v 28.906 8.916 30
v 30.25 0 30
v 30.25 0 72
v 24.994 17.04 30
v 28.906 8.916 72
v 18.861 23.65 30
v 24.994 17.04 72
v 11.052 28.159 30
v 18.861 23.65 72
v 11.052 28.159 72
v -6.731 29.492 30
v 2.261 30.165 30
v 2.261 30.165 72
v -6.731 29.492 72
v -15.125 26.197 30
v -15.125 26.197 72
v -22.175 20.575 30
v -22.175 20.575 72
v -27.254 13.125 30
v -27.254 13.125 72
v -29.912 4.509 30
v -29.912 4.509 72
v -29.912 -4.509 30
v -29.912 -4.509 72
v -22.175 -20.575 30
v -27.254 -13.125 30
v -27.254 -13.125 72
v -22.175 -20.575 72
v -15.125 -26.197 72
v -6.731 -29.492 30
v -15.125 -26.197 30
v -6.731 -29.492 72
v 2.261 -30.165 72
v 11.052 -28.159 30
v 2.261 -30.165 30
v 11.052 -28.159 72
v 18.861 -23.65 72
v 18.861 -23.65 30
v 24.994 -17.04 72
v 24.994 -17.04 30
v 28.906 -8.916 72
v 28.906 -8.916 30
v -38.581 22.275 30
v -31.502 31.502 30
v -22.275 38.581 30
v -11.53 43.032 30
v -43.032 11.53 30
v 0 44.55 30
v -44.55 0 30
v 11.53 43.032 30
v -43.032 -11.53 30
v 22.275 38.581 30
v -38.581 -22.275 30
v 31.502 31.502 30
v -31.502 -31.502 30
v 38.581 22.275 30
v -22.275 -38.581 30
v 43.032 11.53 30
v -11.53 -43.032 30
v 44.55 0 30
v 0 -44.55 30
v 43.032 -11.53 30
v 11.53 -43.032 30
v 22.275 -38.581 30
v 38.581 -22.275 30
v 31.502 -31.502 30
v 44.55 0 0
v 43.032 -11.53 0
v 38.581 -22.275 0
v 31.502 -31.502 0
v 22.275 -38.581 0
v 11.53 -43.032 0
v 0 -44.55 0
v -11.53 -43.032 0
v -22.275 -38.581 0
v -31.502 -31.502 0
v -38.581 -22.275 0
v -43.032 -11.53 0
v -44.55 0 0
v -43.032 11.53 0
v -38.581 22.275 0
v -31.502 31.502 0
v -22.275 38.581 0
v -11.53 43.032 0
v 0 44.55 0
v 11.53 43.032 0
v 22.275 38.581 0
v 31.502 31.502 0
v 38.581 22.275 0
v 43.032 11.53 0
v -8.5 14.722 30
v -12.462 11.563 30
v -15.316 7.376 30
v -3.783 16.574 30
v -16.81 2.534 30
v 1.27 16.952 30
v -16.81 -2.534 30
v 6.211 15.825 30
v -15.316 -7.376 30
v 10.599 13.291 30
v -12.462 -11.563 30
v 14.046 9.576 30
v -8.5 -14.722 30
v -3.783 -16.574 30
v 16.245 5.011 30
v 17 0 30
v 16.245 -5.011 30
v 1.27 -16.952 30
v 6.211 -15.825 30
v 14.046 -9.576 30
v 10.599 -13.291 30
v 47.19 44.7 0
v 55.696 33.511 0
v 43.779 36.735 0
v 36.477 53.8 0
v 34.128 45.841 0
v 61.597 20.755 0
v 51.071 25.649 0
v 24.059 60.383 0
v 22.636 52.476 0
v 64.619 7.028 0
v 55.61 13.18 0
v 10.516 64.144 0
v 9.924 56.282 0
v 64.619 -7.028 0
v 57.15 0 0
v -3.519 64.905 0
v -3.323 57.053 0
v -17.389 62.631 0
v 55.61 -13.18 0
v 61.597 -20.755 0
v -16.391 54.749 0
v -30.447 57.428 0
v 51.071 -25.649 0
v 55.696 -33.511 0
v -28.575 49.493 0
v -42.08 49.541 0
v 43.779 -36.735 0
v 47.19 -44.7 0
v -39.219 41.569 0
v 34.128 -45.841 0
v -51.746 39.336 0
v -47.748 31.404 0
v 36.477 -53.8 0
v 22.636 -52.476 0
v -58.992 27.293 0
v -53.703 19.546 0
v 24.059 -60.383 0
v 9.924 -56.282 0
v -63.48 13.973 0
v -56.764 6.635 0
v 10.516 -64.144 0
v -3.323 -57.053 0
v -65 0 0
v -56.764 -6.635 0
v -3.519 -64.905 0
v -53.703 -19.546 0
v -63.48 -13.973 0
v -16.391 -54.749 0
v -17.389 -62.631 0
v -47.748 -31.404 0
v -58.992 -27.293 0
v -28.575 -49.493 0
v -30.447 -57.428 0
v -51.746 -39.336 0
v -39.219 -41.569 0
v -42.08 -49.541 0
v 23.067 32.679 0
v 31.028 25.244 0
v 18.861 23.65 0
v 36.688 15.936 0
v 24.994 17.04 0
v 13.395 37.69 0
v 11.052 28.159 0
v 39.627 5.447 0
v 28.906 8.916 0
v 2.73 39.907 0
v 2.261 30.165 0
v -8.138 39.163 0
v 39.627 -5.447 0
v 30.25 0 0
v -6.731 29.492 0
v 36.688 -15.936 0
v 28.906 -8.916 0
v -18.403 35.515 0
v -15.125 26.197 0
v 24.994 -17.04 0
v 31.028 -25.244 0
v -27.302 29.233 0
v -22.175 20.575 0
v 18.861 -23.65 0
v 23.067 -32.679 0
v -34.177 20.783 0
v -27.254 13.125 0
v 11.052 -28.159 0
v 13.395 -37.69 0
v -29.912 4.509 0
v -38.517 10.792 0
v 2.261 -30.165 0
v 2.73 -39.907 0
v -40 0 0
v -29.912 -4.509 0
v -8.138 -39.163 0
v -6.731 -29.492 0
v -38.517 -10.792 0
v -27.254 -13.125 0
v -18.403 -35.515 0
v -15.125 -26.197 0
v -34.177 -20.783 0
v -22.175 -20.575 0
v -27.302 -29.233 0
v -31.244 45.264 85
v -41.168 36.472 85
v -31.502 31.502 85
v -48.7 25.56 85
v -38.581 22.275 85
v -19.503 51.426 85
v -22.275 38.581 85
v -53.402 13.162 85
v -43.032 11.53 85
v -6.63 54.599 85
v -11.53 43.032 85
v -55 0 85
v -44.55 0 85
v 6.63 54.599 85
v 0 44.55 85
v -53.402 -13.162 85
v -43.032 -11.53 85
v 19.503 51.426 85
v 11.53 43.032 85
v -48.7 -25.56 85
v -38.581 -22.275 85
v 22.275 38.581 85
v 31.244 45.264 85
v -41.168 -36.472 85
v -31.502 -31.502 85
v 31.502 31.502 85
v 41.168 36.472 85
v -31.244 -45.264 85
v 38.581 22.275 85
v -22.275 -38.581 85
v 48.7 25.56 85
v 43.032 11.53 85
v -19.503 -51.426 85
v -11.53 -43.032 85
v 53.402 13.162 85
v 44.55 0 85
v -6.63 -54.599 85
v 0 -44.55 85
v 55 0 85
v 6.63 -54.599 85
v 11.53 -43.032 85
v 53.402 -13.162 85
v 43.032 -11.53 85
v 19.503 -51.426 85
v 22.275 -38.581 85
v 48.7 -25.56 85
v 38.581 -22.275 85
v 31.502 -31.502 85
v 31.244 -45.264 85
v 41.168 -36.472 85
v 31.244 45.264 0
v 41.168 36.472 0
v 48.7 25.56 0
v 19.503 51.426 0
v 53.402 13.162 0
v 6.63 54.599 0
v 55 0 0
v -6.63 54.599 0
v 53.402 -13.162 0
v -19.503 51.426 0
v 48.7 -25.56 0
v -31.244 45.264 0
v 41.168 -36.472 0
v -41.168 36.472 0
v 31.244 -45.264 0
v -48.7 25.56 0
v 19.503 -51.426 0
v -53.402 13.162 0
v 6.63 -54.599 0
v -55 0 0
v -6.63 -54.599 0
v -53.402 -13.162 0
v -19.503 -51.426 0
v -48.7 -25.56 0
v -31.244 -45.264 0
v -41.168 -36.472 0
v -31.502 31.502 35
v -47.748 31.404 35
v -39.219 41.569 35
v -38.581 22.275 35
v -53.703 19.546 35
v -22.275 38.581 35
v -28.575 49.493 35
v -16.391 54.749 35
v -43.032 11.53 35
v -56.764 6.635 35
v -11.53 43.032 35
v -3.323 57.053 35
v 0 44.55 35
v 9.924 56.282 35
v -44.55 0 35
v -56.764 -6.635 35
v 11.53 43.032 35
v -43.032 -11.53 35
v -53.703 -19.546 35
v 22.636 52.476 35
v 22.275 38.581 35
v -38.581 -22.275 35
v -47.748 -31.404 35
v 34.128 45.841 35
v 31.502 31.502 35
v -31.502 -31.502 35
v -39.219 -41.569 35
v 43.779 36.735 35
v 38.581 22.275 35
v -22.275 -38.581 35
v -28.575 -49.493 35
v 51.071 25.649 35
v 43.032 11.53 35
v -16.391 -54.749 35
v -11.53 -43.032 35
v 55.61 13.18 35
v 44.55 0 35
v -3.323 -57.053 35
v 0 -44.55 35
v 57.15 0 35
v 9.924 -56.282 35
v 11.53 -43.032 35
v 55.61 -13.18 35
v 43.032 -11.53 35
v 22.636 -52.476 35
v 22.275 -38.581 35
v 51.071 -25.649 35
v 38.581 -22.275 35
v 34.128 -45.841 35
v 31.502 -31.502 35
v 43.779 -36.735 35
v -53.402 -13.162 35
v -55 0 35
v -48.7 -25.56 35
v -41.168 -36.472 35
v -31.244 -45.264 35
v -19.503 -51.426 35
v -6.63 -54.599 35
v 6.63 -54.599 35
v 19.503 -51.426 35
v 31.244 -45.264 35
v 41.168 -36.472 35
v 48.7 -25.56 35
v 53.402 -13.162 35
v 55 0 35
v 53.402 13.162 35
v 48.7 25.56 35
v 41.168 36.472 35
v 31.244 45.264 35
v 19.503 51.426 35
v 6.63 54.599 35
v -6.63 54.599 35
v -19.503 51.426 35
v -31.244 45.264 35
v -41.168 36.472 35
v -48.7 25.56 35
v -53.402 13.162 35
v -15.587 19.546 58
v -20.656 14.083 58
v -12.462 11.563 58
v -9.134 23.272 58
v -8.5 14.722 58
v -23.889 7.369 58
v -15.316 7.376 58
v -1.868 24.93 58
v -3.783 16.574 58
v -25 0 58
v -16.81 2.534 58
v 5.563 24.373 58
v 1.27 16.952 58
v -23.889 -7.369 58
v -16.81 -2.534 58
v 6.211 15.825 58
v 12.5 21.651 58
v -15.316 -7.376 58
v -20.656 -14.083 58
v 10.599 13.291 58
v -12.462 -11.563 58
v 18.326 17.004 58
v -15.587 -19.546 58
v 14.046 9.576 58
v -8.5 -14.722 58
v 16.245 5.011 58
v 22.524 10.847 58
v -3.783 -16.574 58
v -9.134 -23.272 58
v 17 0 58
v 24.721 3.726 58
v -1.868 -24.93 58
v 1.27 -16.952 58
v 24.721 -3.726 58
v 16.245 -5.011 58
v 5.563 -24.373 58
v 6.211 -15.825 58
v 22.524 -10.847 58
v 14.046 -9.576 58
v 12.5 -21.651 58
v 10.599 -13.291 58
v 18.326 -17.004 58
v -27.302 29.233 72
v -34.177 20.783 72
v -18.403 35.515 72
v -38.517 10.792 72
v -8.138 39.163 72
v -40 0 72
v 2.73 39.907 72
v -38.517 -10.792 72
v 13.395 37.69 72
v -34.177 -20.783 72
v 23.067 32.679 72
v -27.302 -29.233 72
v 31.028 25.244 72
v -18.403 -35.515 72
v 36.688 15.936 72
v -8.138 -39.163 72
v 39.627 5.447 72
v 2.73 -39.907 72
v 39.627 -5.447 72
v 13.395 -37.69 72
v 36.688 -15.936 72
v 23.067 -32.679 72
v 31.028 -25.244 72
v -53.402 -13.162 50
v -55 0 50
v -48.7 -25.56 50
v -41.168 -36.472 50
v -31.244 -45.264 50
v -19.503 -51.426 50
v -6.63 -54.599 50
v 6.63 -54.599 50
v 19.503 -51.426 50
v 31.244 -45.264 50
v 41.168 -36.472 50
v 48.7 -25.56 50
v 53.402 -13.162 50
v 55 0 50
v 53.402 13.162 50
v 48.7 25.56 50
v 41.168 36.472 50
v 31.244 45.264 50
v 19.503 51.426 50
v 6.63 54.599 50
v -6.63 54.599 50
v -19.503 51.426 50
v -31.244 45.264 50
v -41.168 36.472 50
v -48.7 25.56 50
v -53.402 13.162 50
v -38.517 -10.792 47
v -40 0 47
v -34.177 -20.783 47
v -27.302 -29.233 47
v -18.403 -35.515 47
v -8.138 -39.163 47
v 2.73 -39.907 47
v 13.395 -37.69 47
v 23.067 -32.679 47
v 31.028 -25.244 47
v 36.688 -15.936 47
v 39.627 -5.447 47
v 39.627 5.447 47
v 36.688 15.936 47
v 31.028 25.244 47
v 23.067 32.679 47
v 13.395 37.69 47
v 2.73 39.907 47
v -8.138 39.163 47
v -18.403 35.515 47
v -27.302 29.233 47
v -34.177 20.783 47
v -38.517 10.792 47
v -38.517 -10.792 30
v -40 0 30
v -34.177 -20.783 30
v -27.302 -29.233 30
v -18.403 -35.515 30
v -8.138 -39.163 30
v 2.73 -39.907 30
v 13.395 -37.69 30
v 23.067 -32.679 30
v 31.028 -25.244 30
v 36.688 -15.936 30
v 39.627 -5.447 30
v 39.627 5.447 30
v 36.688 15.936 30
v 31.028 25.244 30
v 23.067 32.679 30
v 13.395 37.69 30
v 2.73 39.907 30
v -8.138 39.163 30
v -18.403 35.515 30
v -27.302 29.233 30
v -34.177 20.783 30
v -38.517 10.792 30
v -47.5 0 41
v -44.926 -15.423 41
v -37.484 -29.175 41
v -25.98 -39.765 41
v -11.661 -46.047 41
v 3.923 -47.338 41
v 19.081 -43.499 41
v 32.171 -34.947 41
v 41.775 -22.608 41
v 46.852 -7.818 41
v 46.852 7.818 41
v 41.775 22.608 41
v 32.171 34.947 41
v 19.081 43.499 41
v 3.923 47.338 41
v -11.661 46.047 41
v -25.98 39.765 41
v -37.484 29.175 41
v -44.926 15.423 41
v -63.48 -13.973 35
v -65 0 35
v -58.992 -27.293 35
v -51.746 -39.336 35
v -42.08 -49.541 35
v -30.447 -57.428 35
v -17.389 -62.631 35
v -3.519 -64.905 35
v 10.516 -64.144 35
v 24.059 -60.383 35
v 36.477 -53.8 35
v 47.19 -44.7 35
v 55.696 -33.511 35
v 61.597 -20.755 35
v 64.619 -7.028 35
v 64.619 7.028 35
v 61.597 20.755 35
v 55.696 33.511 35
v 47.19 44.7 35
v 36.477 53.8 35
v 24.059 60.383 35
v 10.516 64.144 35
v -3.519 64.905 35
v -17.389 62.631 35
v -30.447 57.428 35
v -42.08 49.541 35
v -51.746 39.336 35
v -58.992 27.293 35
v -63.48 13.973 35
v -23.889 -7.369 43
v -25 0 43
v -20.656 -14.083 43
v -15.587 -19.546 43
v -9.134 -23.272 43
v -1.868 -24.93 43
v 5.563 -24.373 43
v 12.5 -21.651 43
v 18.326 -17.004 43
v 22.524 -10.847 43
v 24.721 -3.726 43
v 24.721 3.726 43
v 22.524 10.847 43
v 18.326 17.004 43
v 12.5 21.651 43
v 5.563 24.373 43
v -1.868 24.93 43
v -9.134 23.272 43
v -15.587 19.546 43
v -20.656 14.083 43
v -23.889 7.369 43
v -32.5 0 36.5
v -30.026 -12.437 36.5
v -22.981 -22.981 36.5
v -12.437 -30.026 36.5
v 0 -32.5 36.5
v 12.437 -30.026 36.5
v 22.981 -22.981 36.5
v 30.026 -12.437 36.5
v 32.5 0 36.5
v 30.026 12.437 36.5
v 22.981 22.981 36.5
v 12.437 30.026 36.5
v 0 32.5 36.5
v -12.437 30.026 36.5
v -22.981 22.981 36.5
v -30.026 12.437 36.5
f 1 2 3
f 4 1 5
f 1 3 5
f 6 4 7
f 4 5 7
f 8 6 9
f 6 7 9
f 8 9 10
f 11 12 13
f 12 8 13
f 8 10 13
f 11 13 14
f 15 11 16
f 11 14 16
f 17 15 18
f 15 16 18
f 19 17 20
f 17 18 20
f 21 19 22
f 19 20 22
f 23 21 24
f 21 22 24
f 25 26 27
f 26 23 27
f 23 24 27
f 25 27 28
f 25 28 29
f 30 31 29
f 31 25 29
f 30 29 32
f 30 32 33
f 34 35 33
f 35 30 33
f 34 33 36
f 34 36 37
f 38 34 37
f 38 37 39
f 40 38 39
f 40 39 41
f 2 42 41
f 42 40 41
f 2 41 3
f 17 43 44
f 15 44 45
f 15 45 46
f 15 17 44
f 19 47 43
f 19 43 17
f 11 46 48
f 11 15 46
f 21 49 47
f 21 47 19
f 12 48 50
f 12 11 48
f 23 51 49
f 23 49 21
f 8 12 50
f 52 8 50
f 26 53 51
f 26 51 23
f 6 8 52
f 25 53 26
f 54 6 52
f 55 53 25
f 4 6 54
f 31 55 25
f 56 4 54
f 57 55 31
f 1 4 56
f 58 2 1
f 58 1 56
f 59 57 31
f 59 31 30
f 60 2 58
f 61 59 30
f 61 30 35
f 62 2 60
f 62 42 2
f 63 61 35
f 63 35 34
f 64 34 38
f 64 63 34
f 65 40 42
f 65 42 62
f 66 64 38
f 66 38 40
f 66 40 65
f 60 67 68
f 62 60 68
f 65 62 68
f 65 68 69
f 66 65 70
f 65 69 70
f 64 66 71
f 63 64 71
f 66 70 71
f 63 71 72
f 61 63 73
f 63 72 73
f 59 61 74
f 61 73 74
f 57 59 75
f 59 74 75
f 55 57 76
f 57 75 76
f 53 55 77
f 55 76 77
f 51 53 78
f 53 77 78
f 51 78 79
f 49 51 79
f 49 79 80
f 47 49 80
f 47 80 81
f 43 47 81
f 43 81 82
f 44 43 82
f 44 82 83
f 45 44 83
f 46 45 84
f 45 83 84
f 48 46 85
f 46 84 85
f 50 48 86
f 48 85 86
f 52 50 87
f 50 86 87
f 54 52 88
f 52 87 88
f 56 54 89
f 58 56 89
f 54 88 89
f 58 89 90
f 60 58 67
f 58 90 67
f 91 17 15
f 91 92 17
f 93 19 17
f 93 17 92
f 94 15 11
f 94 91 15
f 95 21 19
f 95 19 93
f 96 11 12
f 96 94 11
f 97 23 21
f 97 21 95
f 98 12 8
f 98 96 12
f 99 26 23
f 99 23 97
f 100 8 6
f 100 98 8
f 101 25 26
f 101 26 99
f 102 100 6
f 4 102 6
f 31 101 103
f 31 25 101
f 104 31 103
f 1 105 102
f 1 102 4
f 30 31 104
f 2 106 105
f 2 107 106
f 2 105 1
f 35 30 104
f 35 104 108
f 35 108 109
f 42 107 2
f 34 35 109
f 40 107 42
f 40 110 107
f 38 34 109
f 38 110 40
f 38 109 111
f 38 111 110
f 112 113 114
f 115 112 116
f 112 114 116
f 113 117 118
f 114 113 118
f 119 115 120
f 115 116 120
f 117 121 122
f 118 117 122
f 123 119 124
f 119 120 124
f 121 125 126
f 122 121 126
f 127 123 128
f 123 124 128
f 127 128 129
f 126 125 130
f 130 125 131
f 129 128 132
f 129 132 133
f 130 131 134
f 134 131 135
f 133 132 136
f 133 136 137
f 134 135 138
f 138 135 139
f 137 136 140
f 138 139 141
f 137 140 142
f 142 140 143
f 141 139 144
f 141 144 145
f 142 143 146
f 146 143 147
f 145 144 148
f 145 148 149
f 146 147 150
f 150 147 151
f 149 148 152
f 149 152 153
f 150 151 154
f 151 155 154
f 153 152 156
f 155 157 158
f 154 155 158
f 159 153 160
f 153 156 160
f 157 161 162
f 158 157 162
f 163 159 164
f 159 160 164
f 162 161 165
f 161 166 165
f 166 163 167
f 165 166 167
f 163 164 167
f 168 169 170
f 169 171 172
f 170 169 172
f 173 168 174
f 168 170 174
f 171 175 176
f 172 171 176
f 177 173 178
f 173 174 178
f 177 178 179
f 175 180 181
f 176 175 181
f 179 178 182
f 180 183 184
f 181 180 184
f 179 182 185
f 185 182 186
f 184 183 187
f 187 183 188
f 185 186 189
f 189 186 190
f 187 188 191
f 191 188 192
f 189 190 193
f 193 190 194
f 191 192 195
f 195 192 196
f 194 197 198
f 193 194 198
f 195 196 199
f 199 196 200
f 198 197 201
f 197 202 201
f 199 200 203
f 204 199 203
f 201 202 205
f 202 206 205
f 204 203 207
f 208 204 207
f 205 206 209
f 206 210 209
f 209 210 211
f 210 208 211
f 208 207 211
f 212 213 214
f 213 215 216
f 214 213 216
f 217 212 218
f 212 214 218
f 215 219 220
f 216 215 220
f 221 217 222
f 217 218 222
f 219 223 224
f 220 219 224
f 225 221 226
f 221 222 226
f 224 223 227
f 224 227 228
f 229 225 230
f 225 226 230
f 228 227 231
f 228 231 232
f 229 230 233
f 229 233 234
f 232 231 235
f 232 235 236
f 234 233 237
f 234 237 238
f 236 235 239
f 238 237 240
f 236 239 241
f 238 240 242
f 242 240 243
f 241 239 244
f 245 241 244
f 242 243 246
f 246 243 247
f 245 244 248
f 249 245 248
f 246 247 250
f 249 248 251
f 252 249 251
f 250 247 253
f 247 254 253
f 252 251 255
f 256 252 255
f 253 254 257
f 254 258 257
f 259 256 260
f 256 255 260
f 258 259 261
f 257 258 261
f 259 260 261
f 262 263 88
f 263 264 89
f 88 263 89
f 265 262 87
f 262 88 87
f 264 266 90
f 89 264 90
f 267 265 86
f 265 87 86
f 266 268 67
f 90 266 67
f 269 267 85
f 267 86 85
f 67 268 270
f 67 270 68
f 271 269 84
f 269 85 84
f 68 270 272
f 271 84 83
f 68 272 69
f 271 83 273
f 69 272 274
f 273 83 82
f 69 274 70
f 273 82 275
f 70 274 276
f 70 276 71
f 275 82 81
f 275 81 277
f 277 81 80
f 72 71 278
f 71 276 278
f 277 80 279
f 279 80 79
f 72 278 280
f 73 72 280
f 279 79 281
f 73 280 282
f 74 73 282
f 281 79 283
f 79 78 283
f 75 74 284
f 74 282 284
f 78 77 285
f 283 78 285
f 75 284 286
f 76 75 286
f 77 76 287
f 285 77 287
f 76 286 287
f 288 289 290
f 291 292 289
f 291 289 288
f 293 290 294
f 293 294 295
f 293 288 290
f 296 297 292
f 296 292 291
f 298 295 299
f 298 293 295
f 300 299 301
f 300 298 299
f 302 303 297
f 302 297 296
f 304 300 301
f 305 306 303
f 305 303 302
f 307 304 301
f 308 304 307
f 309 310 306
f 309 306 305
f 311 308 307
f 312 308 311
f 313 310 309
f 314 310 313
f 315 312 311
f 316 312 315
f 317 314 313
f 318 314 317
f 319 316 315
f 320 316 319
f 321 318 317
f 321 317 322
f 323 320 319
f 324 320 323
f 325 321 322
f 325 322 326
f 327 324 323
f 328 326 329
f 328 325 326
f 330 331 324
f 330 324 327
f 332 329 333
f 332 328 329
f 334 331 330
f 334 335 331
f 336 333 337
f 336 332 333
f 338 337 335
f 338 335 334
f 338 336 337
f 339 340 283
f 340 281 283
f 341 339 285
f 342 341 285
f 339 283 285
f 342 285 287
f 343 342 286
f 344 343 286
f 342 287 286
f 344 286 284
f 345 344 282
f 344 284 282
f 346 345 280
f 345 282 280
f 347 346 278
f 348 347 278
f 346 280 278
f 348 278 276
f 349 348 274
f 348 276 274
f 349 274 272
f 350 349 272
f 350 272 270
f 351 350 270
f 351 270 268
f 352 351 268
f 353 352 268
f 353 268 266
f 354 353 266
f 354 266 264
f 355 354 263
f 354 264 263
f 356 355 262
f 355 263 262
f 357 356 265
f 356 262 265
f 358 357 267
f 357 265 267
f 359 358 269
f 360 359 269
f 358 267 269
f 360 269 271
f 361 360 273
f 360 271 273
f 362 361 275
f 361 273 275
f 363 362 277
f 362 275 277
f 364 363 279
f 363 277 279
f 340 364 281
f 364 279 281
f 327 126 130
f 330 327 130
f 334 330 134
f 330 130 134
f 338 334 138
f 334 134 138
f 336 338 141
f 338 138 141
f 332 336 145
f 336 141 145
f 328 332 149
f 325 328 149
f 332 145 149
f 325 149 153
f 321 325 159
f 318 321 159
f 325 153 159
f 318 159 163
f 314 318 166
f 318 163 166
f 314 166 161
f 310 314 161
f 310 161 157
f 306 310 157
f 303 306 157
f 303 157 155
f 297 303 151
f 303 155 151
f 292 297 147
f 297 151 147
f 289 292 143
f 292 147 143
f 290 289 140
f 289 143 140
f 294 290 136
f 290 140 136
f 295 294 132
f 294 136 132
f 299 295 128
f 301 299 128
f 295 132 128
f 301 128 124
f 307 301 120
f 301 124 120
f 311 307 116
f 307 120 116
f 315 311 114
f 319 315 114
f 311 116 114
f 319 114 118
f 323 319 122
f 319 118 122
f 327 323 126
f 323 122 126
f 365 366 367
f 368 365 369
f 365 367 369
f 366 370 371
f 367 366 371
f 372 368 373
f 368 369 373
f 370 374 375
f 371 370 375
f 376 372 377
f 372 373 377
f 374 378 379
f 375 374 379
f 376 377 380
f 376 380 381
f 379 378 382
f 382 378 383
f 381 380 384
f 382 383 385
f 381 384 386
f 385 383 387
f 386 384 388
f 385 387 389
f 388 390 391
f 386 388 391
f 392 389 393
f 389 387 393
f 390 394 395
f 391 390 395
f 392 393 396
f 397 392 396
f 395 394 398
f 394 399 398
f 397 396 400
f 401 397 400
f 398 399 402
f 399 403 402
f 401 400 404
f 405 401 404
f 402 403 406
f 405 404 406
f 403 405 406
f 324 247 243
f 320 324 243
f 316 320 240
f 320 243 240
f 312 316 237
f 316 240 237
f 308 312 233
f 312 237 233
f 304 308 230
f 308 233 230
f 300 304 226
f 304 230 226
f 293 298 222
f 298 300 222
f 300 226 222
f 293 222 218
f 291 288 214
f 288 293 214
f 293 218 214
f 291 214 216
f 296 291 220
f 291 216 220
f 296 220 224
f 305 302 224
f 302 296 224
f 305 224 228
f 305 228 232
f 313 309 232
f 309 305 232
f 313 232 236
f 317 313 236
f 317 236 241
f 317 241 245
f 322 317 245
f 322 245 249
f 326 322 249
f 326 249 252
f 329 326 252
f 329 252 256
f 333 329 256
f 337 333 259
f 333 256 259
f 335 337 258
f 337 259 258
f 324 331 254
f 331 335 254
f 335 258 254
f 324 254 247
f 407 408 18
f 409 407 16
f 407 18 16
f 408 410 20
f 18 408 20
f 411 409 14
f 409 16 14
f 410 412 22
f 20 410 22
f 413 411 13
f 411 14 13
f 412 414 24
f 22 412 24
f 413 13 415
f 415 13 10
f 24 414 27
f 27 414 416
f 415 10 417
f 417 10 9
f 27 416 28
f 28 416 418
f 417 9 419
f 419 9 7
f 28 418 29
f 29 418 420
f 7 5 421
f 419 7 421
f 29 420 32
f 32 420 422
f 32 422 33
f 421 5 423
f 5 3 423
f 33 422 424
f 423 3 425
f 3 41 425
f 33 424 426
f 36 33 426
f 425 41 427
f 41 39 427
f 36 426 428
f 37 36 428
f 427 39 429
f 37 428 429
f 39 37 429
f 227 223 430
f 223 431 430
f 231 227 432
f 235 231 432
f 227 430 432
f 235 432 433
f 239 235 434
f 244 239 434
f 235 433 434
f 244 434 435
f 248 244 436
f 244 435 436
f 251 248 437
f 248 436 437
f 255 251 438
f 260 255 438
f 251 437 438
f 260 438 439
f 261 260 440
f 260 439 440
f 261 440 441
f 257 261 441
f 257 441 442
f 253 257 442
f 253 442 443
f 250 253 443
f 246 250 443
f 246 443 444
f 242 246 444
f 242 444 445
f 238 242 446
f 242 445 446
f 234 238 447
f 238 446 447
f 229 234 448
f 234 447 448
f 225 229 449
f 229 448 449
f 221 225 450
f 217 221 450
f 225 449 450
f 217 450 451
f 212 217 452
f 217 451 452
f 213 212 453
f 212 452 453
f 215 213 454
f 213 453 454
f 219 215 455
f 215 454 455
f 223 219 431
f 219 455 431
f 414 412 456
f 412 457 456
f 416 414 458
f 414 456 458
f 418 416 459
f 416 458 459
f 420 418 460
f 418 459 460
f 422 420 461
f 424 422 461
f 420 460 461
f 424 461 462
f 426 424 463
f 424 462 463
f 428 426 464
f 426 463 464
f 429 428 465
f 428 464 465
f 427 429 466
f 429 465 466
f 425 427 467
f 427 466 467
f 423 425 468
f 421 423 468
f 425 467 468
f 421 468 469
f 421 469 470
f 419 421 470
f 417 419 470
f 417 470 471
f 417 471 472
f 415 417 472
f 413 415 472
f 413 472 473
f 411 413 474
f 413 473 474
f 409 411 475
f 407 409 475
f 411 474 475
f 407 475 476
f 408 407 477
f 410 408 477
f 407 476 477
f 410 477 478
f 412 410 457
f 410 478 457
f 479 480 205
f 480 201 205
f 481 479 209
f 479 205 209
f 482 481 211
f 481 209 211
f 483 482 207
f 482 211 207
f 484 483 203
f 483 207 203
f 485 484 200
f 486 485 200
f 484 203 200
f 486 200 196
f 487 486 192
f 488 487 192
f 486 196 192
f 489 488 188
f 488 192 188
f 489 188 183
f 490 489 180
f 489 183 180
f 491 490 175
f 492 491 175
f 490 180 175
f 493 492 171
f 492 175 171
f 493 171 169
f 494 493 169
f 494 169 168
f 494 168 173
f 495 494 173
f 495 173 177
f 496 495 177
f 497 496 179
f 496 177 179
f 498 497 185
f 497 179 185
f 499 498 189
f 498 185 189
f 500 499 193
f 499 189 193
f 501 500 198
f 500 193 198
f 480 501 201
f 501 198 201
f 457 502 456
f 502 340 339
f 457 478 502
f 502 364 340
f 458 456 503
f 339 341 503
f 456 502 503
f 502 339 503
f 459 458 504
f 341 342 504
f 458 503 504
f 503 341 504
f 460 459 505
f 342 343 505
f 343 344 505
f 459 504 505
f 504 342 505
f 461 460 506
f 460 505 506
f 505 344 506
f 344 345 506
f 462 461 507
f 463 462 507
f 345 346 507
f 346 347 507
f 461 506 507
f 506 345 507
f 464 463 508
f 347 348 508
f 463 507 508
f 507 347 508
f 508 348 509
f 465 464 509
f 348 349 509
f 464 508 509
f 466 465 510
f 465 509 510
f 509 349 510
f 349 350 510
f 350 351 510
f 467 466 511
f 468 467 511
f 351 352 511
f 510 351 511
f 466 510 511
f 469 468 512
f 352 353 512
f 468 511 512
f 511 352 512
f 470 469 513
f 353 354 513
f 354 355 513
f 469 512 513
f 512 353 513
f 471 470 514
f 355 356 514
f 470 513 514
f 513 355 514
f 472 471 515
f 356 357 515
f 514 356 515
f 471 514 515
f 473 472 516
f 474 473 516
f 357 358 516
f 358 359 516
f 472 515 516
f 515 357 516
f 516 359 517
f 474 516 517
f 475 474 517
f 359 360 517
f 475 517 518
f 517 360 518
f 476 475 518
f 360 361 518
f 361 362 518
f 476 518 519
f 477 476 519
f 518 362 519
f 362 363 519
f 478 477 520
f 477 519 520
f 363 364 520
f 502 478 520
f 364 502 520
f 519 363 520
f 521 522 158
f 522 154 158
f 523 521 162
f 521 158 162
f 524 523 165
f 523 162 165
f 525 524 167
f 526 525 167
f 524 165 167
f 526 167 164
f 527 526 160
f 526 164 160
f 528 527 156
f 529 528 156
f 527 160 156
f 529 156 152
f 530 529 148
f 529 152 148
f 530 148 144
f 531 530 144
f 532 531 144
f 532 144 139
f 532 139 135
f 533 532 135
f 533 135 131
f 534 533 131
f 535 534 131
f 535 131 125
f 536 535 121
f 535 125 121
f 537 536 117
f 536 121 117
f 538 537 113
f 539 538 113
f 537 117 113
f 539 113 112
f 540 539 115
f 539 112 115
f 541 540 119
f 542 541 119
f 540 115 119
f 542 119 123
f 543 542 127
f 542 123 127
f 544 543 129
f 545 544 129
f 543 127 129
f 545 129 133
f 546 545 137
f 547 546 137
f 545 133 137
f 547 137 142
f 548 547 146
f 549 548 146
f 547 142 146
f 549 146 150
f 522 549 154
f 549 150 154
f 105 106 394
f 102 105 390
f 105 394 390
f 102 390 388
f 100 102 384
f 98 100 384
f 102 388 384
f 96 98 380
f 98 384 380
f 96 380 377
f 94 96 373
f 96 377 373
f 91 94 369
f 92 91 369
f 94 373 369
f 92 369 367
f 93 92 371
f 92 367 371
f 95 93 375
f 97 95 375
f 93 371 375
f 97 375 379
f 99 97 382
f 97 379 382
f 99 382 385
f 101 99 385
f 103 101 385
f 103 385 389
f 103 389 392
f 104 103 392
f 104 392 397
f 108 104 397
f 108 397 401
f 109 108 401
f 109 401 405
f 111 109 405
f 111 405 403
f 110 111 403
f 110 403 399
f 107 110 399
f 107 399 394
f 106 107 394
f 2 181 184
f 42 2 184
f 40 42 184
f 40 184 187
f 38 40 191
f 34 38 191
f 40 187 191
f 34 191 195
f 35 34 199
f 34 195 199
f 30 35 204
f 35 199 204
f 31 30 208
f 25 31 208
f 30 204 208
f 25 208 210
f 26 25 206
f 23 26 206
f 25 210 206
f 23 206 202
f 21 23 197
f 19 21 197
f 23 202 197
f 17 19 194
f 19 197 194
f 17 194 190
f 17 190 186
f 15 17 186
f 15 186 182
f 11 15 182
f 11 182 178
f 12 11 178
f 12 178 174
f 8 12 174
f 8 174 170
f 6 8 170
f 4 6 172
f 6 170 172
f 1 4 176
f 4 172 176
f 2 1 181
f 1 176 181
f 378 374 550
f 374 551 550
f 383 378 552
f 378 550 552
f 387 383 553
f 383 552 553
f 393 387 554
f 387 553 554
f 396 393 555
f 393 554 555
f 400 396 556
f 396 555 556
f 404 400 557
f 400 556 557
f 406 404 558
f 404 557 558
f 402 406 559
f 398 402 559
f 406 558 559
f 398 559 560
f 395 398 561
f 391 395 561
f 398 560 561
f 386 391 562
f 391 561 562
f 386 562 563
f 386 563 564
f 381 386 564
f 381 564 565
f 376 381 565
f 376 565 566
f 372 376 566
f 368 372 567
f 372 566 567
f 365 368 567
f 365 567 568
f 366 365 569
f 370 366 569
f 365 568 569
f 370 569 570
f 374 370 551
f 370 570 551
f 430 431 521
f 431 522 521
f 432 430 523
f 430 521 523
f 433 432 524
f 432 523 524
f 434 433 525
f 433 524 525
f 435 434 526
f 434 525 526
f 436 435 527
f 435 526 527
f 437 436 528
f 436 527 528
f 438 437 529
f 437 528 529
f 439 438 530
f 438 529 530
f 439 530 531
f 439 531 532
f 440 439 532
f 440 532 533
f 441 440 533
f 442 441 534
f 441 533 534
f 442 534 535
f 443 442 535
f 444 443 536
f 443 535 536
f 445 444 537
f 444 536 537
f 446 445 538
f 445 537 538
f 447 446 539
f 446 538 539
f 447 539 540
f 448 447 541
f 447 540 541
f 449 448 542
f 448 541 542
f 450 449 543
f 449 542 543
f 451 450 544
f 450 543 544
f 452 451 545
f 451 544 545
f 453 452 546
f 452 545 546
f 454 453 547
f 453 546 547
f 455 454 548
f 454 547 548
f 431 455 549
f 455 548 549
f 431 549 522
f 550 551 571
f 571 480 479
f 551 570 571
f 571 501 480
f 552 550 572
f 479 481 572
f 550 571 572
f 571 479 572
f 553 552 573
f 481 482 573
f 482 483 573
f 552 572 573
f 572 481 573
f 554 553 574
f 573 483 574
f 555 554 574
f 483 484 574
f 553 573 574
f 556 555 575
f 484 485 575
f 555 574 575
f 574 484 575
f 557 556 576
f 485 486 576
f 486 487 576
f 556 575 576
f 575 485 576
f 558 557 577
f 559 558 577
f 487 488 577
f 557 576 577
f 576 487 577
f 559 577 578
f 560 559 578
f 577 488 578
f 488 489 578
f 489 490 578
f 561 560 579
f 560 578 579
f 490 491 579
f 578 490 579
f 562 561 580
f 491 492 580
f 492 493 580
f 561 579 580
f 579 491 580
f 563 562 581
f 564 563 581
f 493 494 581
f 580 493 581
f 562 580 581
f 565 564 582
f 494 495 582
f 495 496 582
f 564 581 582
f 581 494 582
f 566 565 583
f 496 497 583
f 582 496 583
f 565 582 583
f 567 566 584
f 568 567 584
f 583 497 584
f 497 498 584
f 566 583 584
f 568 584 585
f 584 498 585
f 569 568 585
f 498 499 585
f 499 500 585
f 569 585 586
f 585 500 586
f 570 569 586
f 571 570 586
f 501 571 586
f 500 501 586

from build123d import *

# Parameters (mm, degrees)
F2_R      = 17
F4_DEPTH  = 58.001
F3_R      = 30.25
F5_DEPTH  = 30
F8_R      = 30.25
F9_DEPTH  = 72.001
F10_R     = 44.55
F10_R_2   = 30.25
F11_DEPTH = 30
F14_R     = 44.55
F15_DEPTH = 85.001
F16_R     = 57.15
F16_R_2   = 44.55
F17_DEPTH = 35


with BuildPart() as f1:
    # F0 (on Front) → F1 (revolve)
    with BuildSketch(Plane.XZ):
        Polygon((-40, 0), (0, 0), (0, 58), (-25, 58), (-25, 43), (-40, 30), align=None)
    revolve(axis=Axis((0, 0, 29), (0, 0, 1)))

    # F2 (on face) → F4 (cut, through all)
    with BuildSketch(Plane.XY.offset(58)):
        Circle(F2_R)
    extrude(amount=-F4_DEPTH, mode=Mode.SUBTRACT)

    # F3 (on face) → F5 (cut)
    with BuildSketch(Plane(origin=(0, 0, 0), x_dir=(1, 0, 0), z_dir=(0, 0, -1))):
        Circle(F3_R)
    extrude(amount=-F5_DEPTH, mode=Mode.SUBTRACT)


with BuildPart() as f7:
    # F6 (on Front) → F7 (revolve)
    with BuildSketch(Plane.XZ):
        Polygon((-55, 0), (0, 0), (0, 72), (-40, 72), (-40, 47), (-55, 35), align=None)
    revolve(axis=Axis((0, 0, 36), (0, 0, 1)))

    # F8 (on face) → F9 (cut, through all)
    with BuildSketch(Plane.XY.offset(72)):
        Circle(F8_R)
    extrude(amount=-F9_DEPTH, mode=Mode.SUBTRACT)

    # F10 (on face) → F11 (cut)
    with BuildSketch(Plane(origin=(0, 0, 0), x_dir=(1, 0, 0), z_dir=(0, 0, -1))):
        Circle(F10_R)
        Circle(F10_R_2, mode=Mode.SUBTRACT)
    extrude(amount=-F11_DEPTH, mode=Mode.SUBTRACT)


with BuildPart() as f13:
    # F12 (on Front) → F13 (revolve)
    with BuildSketch(Plane.XZ):
        Polygon((-65, 0), (0, 0), (0, 85), (-55, 85), (-55, 50), (-65, 35), align=None)
    revolve(axis=Axis((0, 0, 42.5), (0, 0, 1)))

    # F14 (on face) → F15 (cut, through all)
    with BuildSketch(Plane.XY.offset(85)):
        Circle(F14_R)
    extrude(amount=-F15_DEPTH, mode=Mode.SUBTRACT)

    # F16 (on face) → F17 (cut)
    with BuildSketch(Plane(origin=(0, 0, 0), x_dir=(1, 0, 0), z_dir=(0, 0, -1))):
        Circle(F16_R)
        Circle(F16_R_2, mode=Mode.SUBTRACT)
    extrude(amount=-F17_DEPTH, mode=Mode.SUBTRACT)


solid = Compound([f1.part, f7.part, f13.part])
